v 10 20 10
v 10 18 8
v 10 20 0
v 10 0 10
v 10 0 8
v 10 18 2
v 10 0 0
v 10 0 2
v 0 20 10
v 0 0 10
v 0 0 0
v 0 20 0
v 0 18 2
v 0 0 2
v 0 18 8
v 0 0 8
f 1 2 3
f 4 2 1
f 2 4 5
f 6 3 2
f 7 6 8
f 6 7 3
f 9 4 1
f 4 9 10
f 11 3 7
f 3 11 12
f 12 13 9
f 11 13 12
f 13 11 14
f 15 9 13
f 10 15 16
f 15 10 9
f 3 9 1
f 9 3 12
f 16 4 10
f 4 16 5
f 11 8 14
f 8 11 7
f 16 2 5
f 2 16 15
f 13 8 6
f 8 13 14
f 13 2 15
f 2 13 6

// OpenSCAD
difference() {
  cube([10,20,10]);

  translate([-5,-2,2])
  cube([20,20,6]);
}
